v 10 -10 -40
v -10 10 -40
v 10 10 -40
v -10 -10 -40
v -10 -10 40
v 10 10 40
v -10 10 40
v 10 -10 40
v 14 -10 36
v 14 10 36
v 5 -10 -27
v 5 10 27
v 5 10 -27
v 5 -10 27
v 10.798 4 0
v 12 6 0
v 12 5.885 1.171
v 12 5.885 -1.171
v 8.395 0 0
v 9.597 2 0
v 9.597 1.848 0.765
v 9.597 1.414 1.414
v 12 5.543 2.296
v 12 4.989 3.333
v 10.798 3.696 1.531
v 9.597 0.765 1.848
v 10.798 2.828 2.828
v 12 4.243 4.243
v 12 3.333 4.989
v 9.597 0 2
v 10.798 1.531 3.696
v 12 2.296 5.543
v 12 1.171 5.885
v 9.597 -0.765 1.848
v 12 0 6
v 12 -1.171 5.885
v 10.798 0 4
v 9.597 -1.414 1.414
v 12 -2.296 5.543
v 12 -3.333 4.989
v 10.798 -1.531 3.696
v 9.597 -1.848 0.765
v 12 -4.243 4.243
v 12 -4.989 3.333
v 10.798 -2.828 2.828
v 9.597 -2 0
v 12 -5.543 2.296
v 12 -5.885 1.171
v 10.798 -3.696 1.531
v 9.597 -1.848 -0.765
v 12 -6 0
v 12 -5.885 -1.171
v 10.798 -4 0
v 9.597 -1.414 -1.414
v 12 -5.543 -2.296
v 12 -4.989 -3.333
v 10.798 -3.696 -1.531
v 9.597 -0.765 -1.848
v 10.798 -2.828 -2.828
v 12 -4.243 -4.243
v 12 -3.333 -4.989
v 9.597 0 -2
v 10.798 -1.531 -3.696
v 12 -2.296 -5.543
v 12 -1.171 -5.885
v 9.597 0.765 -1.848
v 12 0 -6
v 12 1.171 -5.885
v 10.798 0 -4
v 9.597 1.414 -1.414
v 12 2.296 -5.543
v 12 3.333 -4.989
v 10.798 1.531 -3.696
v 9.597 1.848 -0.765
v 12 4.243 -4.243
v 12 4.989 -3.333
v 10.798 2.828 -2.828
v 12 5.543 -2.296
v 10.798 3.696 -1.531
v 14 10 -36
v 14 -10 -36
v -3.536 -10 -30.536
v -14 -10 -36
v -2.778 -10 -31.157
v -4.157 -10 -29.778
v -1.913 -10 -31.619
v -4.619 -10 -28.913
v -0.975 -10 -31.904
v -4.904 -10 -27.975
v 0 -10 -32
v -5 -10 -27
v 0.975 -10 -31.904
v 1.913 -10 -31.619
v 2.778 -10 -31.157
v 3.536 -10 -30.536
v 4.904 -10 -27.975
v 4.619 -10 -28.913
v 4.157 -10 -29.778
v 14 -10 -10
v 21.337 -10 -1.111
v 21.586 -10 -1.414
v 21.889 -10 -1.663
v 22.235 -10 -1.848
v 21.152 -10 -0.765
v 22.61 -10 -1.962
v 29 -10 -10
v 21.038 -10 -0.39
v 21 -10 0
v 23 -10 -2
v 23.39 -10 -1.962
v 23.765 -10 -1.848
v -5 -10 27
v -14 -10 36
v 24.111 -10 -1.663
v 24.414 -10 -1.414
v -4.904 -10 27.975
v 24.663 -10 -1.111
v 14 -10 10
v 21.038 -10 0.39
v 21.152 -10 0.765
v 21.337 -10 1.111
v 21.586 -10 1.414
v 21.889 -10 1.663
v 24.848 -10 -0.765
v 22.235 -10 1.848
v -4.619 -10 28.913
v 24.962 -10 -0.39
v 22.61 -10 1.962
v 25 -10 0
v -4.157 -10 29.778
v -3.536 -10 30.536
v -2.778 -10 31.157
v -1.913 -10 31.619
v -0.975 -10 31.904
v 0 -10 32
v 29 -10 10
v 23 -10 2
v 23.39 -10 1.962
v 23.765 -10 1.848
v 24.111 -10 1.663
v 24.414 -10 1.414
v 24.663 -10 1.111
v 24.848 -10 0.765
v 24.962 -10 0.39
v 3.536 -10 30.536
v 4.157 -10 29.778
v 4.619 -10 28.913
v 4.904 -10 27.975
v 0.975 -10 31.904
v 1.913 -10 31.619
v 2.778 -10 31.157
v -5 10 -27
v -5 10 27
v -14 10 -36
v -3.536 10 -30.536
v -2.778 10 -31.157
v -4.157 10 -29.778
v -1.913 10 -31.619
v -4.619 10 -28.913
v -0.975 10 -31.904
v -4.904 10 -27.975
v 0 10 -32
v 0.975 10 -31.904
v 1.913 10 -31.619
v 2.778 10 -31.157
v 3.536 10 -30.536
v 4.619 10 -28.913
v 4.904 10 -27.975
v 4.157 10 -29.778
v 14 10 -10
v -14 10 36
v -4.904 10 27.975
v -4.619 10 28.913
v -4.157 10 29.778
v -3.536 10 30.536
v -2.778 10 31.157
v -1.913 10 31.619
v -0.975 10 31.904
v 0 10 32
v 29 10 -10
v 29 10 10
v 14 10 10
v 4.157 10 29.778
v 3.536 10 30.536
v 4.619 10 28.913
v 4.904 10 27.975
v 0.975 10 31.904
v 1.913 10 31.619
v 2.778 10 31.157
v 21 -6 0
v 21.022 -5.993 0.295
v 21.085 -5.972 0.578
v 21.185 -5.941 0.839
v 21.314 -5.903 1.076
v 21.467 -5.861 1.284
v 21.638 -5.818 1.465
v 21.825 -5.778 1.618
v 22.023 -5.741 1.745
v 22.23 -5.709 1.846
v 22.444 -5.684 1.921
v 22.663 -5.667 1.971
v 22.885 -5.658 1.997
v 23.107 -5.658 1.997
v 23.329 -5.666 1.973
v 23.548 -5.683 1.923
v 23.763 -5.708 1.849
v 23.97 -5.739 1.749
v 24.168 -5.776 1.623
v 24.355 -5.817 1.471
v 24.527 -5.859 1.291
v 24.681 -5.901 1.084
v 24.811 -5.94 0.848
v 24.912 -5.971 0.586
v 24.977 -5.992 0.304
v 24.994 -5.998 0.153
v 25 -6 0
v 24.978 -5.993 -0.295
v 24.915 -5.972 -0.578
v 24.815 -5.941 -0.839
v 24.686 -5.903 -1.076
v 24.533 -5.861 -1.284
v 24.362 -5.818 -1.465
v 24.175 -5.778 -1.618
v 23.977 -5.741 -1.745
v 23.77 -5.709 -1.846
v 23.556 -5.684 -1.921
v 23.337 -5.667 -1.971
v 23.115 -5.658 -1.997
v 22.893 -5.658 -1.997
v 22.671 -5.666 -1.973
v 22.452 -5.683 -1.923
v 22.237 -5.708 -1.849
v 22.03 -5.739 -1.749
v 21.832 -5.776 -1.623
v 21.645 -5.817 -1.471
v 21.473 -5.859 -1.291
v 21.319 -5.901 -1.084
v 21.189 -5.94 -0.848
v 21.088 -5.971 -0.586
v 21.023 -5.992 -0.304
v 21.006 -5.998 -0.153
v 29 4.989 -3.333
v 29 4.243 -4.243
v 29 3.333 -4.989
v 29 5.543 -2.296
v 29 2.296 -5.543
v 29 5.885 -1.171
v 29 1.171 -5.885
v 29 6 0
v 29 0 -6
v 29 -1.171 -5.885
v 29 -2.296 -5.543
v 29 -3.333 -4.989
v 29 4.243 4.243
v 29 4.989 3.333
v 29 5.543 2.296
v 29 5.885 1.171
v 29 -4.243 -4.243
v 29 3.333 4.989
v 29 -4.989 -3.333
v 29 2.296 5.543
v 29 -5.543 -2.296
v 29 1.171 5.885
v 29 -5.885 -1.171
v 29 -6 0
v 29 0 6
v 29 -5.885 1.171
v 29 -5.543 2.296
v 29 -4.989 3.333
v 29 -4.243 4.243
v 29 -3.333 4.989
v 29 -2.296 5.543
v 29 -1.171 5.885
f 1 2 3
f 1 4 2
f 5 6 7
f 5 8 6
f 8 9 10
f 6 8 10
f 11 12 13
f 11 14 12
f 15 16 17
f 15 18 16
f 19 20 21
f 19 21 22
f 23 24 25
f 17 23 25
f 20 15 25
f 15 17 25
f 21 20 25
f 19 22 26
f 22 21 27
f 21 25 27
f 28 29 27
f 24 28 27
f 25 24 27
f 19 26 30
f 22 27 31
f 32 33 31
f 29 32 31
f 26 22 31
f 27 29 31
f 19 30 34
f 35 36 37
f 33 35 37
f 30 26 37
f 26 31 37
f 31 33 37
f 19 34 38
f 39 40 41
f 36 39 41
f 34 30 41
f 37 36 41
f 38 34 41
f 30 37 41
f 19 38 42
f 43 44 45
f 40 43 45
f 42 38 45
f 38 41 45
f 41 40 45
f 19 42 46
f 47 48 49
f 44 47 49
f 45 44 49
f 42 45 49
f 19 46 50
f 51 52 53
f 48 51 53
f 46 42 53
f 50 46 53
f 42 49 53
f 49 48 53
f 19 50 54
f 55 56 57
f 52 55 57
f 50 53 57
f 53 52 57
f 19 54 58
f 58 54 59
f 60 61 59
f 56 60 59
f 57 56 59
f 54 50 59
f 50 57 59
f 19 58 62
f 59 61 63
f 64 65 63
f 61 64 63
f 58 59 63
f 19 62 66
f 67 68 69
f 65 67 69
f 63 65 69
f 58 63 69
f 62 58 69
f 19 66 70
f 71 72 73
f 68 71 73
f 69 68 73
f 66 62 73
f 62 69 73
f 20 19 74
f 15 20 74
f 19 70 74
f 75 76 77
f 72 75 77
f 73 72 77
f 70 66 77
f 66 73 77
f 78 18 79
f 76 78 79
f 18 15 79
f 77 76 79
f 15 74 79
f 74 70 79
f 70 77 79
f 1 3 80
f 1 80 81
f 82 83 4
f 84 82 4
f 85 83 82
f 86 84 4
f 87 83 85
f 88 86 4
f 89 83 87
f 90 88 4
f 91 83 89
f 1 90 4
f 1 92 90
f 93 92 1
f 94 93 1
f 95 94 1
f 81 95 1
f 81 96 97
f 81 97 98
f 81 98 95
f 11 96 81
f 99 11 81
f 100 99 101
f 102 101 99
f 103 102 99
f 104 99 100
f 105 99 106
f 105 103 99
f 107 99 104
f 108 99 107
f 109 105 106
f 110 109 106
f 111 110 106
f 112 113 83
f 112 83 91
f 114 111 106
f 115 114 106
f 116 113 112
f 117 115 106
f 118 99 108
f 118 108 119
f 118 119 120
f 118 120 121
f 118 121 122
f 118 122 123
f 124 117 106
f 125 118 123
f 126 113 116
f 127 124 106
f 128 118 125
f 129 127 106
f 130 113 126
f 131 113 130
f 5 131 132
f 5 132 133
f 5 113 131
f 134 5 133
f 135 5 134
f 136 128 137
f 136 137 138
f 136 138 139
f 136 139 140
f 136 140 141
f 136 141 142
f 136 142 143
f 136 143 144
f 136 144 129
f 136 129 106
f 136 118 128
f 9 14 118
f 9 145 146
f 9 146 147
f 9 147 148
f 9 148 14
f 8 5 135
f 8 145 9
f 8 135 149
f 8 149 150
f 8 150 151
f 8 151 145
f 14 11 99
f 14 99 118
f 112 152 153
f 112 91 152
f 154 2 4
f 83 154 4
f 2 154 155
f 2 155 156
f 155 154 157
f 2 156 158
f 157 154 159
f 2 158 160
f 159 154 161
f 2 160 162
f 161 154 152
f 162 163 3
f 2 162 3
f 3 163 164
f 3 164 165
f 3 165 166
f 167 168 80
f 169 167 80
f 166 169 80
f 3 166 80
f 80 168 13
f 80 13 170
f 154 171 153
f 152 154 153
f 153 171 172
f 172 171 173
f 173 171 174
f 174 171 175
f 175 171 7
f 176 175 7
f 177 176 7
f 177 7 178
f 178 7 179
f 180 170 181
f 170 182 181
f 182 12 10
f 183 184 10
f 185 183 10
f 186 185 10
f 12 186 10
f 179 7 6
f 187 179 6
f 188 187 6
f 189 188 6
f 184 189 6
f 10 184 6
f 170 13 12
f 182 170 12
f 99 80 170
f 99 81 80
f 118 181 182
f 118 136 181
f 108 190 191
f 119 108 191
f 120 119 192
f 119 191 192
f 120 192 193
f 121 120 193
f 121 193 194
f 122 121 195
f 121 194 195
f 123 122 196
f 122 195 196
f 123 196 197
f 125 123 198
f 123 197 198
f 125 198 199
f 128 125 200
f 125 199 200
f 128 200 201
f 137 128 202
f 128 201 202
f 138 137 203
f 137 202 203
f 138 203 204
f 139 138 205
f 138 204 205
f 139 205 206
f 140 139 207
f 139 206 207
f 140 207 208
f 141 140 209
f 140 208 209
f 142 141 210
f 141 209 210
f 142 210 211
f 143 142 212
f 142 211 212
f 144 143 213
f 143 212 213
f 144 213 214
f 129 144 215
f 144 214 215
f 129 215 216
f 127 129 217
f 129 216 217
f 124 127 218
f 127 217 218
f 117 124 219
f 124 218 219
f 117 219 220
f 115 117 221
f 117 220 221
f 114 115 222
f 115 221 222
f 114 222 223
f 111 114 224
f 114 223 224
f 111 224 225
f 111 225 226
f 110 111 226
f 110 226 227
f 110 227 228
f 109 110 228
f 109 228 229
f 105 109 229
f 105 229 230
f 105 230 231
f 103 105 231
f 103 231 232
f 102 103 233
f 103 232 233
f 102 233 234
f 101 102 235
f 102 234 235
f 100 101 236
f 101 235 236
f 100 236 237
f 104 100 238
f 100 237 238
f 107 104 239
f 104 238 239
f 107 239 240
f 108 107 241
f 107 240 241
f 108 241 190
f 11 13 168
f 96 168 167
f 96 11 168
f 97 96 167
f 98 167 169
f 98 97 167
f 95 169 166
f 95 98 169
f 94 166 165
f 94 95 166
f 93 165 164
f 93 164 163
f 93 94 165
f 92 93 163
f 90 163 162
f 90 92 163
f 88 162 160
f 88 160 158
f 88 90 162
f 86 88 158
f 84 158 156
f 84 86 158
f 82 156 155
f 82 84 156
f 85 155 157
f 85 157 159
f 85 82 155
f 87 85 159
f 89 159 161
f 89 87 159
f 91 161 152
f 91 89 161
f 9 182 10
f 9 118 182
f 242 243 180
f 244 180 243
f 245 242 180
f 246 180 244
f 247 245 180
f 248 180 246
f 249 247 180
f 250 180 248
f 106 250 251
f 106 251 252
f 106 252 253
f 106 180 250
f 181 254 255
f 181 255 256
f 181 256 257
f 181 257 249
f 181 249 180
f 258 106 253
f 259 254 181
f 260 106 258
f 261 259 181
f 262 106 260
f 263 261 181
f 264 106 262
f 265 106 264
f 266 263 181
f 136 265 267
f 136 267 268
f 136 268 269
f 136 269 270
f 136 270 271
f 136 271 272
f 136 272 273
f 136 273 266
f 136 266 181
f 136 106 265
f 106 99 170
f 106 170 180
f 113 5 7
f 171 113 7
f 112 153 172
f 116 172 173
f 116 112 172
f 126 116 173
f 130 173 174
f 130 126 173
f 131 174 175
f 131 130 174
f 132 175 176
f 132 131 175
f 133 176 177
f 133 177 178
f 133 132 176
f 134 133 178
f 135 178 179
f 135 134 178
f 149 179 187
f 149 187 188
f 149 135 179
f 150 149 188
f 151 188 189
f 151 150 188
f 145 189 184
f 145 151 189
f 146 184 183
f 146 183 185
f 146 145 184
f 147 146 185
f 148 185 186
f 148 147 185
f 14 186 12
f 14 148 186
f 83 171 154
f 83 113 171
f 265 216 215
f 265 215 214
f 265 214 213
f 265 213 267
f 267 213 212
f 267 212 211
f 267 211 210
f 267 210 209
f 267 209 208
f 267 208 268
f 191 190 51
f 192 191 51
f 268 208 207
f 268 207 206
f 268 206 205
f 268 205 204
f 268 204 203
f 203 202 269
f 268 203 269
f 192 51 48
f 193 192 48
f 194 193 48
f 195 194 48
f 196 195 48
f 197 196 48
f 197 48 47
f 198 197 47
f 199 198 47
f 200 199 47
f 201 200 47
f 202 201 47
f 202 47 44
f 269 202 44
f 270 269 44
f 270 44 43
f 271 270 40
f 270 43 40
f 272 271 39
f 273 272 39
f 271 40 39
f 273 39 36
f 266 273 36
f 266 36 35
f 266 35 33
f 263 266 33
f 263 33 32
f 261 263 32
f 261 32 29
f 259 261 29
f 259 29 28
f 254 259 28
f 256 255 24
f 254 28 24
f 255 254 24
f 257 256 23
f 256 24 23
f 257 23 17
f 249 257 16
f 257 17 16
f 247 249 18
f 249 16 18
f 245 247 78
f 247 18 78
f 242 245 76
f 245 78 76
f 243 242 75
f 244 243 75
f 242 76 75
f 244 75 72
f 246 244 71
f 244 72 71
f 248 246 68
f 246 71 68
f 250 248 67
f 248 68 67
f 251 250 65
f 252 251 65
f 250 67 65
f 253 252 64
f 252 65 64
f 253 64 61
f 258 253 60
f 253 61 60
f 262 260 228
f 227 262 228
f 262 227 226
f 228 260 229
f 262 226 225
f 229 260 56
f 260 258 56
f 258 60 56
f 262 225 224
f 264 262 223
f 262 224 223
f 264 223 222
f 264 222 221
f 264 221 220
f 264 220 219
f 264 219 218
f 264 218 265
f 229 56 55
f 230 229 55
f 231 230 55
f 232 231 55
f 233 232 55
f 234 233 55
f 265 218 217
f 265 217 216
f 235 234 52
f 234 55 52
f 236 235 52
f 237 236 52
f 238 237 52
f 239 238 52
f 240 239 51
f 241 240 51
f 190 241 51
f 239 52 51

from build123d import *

# Parameters (mm, degrees)
F1_DEPTH      = 10
F1_DEPTH_BACK = 10
F2_SIZE       = 4
F4_D          = 4
F4_DEPTH      = 10
F4_TIP        = 1.2017212381
F6_D          = 12
F6_DEPTH      = 17
F6_TIP        = 3.6051637142


with BuildPart() as f1:
    # F0 (on Front) → F1 (new body, two sides)
    with BuildSketch(Plane.XZ) as f1_sk:
        Polygon((-14, 40), (-14, -40), (14, -40), (14, -10), (29, -10), (29, 10), (14, 10), (14, 40), align=None)
        with BuildLine():
            ThreePointArc((-5, 27), (0, 32), (5, 27))
            Line((5, 27), (5, -27))
            ThreePointArc((5, -27), (0, -32), (-5, -27))
            Line((-5, -27), (-5, 27))
        make_face(mode=Mode.SUBTRACT)
    extrude(amount=F1_DEPTH)
    extrude(f1_sk.sketch, amount=-F1_DEPTH_BACK)

    # F2
    f2_edges = [f1.edges().sort_by_distance(p)[0] for p in [
        (14, 0, 40),
        (-14, 0, 40),
        (14, 0, -40),
        (-14, 0, -40),
    ]]
    chamfer(f2_edges, length=F2_SIZE)

    # F4
    with Locations(Plane.XZ.offset(10)):
        with Locations((23, 0)):
            Hole(F4_D / 2, depth=F4_DEPTH)
            with Locations((0, 0, -(F4_DEPTH + F4_TIP / 2))):  # 118° drill point
                Cone(0, F4_D / 2, F4_TIP, mode=Mode.SUBTRACT)

    # F6
    with Locations(Plane.YZ.offset(29)):
        with Locations((0, 0)):
            Hole(F6_D / 2, depth=F6_DEPTH)
            with Locations((0, 0, -(F6_DEPTH + F6_TIP / 2))):  # 118° drill point
                Cone(0, F6_D / 2, F6_TIP, mode=Mode.SUBTRACT)


solid = f1.part
